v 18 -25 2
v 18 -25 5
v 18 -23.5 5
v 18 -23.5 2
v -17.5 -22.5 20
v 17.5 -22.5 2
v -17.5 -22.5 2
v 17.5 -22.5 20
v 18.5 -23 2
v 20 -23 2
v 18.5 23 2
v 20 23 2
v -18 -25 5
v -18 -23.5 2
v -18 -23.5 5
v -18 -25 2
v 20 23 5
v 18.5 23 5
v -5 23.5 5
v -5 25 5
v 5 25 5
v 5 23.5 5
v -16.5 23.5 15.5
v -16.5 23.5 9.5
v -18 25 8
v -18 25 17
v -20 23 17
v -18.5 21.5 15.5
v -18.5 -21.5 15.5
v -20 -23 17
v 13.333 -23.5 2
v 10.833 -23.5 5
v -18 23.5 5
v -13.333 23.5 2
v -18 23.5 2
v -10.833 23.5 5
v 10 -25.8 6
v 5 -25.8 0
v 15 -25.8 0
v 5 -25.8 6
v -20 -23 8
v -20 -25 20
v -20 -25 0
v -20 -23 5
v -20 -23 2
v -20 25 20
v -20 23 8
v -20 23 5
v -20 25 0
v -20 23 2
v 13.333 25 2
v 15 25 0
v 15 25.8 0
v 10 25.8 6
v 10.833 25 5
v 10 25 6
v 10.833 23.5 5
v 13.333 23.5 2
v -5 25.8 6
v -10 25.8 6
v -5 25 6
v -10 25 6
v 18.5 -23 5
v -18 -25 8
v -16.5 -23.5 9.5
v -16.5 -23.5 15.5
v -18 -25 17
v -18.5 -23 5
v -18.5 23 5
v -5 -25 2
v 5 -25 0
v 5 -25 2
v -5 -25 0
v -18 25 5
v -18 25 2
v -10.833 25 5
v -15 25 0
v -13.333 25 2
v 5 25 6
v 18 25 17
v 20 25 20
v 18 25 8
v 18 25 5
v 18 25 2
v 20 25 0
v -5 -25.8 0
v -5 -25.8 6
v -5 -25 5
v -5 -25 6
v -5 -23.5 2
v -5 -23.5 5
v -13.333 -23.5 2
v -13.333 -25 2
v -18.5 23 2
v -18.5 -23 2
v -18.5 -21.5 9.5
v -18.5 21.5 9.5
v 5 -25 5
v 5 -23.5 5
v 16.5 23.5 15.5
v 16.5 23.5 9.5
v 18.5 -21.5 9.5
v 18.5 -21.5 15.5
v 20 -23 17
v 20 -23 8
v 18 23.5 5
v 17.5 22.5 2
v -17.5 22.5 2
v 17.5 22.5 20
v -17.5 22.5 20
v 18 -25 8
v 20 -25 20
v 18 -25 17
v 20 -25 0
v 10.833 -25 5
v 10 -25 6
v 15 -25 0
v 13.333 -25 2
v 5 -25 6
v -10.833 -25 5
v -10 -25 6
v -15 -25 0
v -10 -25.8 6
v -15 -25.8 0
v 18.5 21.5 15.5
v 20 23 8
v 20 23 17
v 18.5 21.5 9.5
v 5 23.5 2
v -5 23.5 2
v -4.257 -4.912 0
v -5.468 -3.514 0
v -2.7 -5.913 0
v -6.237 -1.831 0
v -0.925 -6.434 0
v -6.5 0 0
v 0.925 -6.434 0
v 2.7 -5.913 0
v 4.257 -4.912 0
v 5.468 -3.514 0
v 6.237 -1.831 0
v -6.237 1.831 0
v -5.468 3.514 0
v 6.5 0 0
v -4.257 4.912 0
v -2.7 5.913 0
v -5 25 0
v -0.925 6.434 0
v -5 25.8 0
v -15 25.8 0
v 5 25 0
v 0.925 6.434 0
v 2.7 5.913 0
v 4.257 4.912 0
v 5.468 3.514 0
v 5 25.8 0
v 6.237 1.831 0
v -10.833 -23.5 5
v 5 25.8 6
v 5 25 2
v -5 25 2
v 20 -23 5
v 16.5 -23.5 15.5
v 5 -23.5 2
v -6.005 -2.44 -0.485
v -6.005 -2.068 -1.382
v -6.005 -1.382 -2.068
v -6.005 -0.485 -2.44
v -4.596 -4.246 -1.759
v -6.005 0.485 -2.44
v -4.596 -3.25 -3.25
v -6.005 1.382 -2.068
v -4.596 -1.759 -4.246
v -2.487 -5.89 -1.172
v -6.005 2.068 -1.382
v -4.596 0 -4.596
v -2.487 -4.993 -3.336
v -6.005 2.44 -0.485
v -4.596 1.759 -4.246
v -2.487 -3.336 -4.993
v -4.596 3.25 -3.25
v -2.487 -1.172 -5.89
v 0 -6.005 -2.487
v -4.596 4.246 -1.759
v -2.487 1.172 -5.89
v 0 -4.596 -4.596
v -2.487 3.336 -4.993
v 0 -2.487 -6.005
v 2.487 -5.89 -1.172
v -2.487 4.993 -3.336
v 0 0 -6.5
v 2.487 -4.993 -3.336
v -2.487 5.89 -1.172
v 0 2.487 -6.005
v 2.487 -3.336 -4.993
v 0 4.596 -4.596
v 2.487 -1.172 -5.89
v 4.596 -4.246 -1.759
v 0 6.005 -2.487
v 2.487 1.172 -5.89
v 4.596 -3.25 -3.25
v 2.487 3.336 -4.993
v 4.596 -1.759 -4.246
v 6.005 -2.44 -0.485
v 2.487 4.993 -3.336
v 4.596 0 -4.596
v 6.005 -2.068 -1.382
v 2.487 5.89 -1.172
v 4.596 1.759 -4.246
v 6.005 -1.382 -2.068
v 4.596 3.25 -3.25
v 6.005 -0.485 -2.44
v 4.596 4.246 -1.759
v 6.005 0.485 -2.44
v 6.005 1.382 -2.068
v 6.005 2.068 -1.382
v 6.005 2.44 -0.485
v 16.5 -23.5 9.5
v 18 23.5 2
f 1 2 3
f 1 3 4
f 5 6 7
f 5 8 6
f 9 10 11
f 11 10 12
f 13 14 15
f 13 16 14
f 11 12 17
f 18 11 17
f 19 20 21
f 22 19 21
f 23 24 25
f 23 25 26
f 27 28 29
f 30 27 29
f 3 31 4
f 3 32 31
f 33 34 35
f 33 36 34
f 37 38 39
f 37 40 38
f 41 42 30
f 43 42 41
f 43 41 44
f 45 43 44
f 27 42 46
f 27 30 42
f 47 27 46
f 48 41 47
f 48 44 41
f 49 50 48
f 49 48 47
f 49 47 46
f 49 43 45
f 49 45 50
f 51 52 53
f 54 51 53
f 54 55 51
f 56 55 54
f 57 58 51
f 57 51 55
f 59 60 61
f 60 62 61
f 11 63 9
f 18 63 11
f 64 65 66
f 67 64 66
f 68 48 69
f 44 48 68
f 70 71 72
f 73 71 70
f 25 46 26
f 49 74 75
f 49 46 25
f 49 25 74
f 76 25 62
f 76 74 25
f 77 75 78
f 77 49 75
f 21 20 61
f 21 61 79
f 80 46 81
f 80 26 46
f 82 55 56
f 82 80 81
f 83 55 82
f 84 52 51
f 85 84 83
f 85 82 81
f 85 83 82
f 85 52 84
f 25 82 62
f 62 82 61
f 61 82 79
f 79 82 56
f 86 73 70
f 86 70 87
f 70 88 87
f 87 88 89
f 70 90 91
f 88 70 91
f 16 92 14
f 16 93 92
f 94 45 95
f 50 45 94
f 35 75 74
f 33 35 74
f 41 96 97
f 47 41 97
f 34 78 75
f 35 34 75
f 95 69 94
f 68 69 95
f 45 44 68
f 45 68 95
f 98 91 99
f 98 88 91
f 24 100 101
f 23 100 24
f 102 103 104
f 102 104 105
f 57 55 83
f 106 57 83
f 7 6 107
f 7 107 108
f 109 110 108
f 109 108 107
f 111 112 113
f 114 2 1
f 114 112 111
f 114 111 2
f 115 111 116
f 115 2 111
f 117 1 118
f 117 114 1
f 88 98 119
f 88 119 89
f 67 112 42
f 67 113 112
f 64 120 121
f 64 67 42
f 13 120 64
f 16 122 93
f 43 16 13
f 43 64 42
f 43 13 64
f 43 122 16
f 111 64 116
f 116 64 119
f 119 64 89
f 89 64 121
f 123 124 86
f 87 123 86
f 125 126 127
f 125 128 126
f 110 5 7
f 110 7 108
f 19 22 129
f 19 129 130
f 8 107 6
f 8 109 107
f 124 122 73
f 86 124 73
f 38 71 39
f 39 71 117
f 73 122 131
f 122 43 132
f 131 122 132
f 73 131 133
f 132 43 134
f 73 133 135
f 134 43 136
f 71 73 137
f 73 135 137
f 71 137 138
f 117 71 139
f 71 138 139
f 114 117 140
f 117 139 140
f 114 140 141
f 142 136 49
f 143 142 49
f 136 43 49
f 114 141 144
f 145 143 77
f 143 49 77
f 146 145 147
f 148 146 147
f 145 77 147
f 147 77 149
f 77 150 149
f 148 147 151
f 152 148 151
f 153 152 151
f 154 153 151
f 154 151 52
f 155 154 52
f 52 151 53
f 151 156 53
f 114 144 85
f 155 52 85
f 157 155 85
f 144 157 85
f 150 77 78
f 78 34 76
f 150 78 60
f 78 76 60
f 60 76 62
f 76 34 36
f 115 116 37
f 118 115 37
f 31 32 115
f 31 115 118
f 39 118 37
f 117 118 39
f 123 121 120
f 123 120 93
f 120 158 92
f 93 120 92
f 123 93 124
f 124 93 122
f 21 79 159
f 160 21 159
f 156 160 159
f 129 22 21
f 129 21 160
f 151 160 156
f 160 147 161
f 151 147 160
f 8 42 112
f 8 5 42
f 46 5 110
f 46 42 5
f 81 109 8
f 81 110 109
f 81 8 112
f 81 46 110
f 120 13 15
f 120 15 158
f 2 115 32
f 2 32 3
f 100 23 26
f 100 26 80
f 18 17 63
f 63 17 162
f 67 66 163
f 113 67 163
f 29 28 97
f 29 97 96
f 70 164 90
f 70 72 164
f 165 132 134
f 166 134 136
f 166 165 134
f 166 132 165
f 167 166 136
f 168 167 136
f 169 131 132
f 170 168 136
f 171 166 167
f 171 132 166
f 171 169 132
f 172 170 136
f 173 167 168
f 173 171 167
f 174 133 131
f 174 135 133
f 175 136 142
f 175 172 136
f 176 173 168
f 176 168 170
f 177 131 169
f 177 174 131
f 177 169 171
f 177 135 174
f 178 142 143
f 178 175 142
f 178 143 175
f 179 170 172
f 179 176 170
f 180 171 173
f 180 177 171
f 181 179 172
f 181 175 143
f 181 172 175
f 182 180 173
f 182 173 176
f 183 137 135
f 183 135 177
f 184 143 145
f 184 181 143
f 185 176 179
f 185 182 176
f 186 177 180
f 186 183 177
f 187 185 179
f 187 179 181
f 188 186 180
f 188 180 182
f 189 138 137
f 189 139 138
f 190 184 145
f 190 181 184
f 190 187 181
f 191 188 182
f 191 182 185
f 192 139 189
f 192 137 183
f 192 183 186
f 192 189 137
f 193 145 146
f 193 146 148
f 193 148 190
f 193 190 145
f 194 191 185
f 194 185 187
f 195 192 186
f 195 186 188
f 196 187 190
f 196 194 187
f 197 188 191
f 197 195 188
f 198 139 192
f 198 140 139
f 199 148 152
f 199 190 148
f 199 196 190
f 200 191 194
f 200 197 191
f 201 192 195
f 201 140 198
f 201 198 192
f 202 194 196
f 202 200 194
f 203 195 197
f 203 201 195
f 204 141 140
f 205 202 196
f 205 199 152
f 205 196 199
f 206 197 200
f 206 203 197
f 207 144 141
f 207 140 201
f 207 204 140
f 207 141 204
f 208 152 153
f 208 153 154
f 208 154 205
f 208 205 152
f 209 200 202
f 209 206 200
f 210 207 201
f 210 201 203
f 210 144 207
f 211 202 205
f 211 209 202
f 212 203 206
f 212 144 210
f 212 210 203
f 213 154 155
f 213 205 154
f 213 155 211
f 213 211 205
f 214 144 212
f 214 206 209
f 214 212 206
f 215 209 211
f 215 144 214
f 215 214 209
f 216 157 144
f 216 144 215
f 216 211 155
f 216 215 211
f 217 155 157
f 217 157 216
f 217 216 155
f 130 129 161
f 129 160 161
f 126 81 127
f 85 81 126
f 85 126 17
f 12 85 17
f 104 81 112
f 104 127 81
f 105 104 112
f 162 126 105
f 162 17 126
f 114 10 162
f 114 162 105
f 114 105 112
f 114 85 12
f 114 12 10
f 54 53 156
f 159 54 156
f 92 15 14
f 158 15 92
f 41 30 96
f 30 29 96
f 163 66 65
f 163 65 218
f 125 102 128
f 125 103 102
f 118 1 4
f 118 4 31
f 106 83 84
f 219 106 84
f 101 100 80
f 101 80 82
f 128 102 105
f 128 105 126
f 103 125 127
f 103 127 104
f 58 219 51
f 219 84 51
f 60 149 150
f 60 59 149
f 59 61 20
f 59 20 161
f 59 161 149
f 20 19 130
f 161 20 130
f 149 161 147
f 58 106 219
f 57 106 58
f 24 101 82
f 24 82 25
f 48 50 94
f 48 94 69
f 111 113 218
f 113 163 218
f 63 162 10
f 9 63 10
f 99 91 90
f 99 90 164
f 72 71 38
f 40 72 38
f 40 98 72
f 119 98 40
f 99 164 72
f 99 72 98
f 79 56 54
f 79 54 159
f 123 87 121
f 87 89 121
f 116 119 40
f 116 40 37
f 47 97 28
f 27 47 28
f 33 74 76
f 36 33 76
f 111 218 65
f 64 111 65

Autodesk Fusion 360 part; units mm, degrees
sphere "EsferaPrimitiva1" add diameter 13 placed x (0, 1, 0) y (0, 0, 1) z (1, 0, 0) at (0, 0, 0)
sketch "Boceto2" plane through (0, 0, 0) normal (0, 1, 0) x (1, 0, 0)
  circle A0 centre (0, 0) radius 20
  dimension "d2" = 40
sketch "Boceto1" plane through (0, 0, 0) normal (0, 1, 0) x (1, 0, 0)
  circle A0 centre (0, 0) radius 10
  line L0 (0, 0) -> (0, -13.2142)
  dimension "d1" = 20

Autodesk Fusion 360 part; units mm, degrees
sketch "Sketch1" plane through (0, 0, 0) normal (0, 0, 1) x (1, 0, 0)
  line L0 (20, -25) -> (-20, -25)
  line L1 (-20, -25) -> (-20, 25)
  line L2 (-20, 25) -> (20, 25)
  line L3 (20, 25) -> (20, -25)
  line L4 (20, -25) -> (-20, 25) construction
  line L5 (-20, -25) -> (20, 25) construction
  dimension "d1" = 40
  dimension "d2" = 50
extrude "Extrude1" add sketch "Sketch1" along normal blind 20
sketch "Sketch2" plane through (0, 25, 0) normal (0, 1, 0) x (-1, 0, 0)
  line L0 (-20, 0) -> (20, 0)
  line L1 (20, 0) -> (20, 20)
  line L2 (20, 20) -> (-20, 20)
  line L3 (-20, 20) -> (-20, 0)
  line L4 (0, 9) -> (0, 20) construction
  line L5 (0, 9) -> (0, 8) construction
  line L6 (0, 8) -> (18, 8)
  line L7 (18, 8) -> (18, 17)
  line L8 (18, 17) -> (-18, 17)
  line L9 (-18, 17) -> (-18, 8)
  line L10 (-18, 8) -> (0, 8)
  line L11 (-18, 8) -> (-18, 2) construction
  line L12 (-18, 2) -> (18, 2) construction
  line L13 (18, 2) -> (18, 8) construction
  line L14 (-18, 2) -> (18, 2)
  line L15 (18, 2) -> (18, 5)
  line L16 (18, 5) -> (-18, 5)
  line L17 (-18, 5) -> (-18, 2)
  line L18 (20, 0) -> (20, 20)
  dimension "d5" = 3
  dimension "d8" = 2
  dimension "d9" = 6
  dimension "d13" = 2
  dimension "d43" = 2
sketch "Sketch3" plane through (-20, 0, 0) normal (-1, 0, 0) x (0, -1, 0)
  line L0 (-25, 0) -> (25, 0)
  line L1 (25, 0) -> (25, 20)
  line L2 (25, 20) -> (-25, 20)
  line L3 (-25, 20) -> (-25, 0)
  line L4 (-23, 17) -> (23, 17)
  line L5 (23, 17) -> (23, 8)
  line L6 (23, 8) -> (-23, 8)
  line L7 (-23, 8) -> (-23, 17)
  line L8 (-23, 5) -> (23, 5)
  line L9 (23, 5) -> (23, 2)
  line L10 (23, 2) -> (-23, 2)
  line L11 (-23, 2) -> (-23, 5)
  dimension "d14" = 3
  dimension "d15" = 2
  dimension "d16" = 2
  dimension "d18" = 2
  dimension "d19" = 2
  dimension "d20" = 6
  dimension "d21" = 3
  dimension "d22" = 2
sketch "Sketch4" plane through (20, 0, 0) normal (1, 0, 0) x (0, 1, 0)
  line L0 (-25, 0) -> (25, 0)
  line L1 (25, 0) -> (25, 20)
  line L2 (25, 20) -> (-25, 20)
  line L3 (-25, 20) -> (-25, 0)
  line L4 (-23, 8) -> (23, 8)
  line L5 (23, 8) -> (23, 17)
  line L6 (-23, 17) -> (-23, 8)
  line L7 (23, 17) -> (-23, 17)
  line L8 (-23, 2) -> (23, 2)
  line L9 (23, 2) -> (23, 5)
  line L10 (-23, 5) -> (-23, 2)
  line L11 (23, 5) -> (-23, 5)
sketch "Sketch5" plane through (0, -25, 0) normal (0, -1, 0) x (1, 0, 0)
  line L0 (-20, 0) -> (20, 0)
  line L1 (20, 0) -> (20, 20)
  line L2 (20, 20) -> (-20, 20)
  line L3 (-20, 20) -> (-20, 0)
  line L4 (-18, 8) -> (-18, 17)
  line L5 (-18, 17) -> (18, 17)
  line L6 (18, 17) -> (18, 8)
  line L7 (0, 8) -> (-18, 8)
  line L8 (18, 8) -> (0, 8)
  line L9 (18, 2) -> (-18, 2)
  line L10 (-18, 2) -> (-18, 5)
  line L11 (18, 5) -> (18, 2)
  line L12 (-18, 5) -> (18, 5)
extrude "Extrude2" cut sketch "Sketch2" against normal blind 1.5 contours L6 L7 L8 L9 L10 | L14 L15 L16 L17
extrude "Extrude3" cut sketch "Sketch3" against normal blind 1.5 contours L4 L5 L6 L7 | L8 L9 L10 L11
extrude "Extrude4" cut sketch "Sketch5" against normal blind 1.5 contours L4 L5 L6 L7 L8 | L9 L10 L11 L12
extrude "Extrude5" cut sketch "Sketch4" against normal blind 1.5 contours L4 L5 L6 L7 | L8 L9 L10 L11
chamfer "Chamfer1" distance 1.5 angle 45 5 edges at (18, 23.5, 12.5) (0, 23.5, 17) (-18, 23.5, 12.5) (0, 23.5, 8) (18.5, 0, 8) 3 faces at (18.5, -7.6667, 14) (-6, -23.5, 14) (-18.5, 7.6667, 14)
sketch "Sketch6" plane through (0, 0, 20) normal (0, 0, 1) x (-1, 0, 0)
  line L0 (-20, -25) -> (20, -25)
  line L1 (20, -25) -> (20, 25)
  line L2 (20, 25) -> (-20, 25)
  line L3 (-20, 25) -> (-20, -25)
  line L4 (-17.5, 22.5) -> (17.5, 22.5)
  line L5 (17.5, 22.5) -> (17.5, -22.5)
  line L6 (17.5, -22.5) -> (-17.5, -22.5)
  line L7 (-17.5, -22.5) -> (-17.5, 22.5)
  line L8 (-17.5, 22.5) -> (17.5, -22.5) construction
  line L9 (17.5, 22.5) -> (-17.5, -22.5) construction
  dimension "d29" = 2.5
  dimension "d30" = 2.5
extrude "Extrude6" cut sketch "Sketch6" against normal blind 18 contours L4 L5 L6 L7
sketch "Sketch7" plane through (0, -25, 0) normal (0, -1, 0) x (1, 0, 0)
  line L0 (18, 2) -> (-18, 2)
  line L1 (-18, 5) -> (18, 5)
  line L2 (18, 5) -> (18, 2)
  line L3 (-20, 0) -> (20, 0)
  line L4 (20, 0) -> (20, 20)
  line L5 (20, 20) -> (-20, 20)
  line L6 (-20, 20) -> (-20, 0)
  line L7 (0, 0) -> (0, 20)
  line L8 (0, 0) -> (-5, 0) construction
  line L9 (-5, 0) -> (-5, 6)
  line L10 (-5, 6) -> (-10, 6)
  line L11 (-10, 6) -> (-15, 0)
  line L12 (-5, 0) -> (-15, 0)
  line L13 (10, 6) -> (15, 0)
  line L14 (5, 0) -> (15, 0)
  line L15 (5, 6) -> (10, 6)
  line L16 (5, 0) -> (5, 6)
  line L17 (-18, 17) -> (18, 17)
  line L18 (18, 17) -> (18, 8)
  line L19 (18, 8) -> (-18, 8)
  line L20 (-18, 8) -> (-18, 17)
  line L21 (-18, 2) -> (-18, 5)
  dimension "d33" = 6
  dimension "d34" = 5
  dimension "d35" = 10
  dimension "d36" = 5
extrude "Extrude7" add sketch "Sketch7" along normal blind 0.8 and the other way blind 2 contours L0 L3 L13 L14 L16 | L0 L1 L13 L16 | L1 L13 L15 L16 | L0 L3 L9 L11 L12 | L0 L1 L9 L11 | L1 L9 L10 L11
mirror "Mirror1" about plane through (0, 0, 0) normal (0, 1, 0) of "Extrude7"
